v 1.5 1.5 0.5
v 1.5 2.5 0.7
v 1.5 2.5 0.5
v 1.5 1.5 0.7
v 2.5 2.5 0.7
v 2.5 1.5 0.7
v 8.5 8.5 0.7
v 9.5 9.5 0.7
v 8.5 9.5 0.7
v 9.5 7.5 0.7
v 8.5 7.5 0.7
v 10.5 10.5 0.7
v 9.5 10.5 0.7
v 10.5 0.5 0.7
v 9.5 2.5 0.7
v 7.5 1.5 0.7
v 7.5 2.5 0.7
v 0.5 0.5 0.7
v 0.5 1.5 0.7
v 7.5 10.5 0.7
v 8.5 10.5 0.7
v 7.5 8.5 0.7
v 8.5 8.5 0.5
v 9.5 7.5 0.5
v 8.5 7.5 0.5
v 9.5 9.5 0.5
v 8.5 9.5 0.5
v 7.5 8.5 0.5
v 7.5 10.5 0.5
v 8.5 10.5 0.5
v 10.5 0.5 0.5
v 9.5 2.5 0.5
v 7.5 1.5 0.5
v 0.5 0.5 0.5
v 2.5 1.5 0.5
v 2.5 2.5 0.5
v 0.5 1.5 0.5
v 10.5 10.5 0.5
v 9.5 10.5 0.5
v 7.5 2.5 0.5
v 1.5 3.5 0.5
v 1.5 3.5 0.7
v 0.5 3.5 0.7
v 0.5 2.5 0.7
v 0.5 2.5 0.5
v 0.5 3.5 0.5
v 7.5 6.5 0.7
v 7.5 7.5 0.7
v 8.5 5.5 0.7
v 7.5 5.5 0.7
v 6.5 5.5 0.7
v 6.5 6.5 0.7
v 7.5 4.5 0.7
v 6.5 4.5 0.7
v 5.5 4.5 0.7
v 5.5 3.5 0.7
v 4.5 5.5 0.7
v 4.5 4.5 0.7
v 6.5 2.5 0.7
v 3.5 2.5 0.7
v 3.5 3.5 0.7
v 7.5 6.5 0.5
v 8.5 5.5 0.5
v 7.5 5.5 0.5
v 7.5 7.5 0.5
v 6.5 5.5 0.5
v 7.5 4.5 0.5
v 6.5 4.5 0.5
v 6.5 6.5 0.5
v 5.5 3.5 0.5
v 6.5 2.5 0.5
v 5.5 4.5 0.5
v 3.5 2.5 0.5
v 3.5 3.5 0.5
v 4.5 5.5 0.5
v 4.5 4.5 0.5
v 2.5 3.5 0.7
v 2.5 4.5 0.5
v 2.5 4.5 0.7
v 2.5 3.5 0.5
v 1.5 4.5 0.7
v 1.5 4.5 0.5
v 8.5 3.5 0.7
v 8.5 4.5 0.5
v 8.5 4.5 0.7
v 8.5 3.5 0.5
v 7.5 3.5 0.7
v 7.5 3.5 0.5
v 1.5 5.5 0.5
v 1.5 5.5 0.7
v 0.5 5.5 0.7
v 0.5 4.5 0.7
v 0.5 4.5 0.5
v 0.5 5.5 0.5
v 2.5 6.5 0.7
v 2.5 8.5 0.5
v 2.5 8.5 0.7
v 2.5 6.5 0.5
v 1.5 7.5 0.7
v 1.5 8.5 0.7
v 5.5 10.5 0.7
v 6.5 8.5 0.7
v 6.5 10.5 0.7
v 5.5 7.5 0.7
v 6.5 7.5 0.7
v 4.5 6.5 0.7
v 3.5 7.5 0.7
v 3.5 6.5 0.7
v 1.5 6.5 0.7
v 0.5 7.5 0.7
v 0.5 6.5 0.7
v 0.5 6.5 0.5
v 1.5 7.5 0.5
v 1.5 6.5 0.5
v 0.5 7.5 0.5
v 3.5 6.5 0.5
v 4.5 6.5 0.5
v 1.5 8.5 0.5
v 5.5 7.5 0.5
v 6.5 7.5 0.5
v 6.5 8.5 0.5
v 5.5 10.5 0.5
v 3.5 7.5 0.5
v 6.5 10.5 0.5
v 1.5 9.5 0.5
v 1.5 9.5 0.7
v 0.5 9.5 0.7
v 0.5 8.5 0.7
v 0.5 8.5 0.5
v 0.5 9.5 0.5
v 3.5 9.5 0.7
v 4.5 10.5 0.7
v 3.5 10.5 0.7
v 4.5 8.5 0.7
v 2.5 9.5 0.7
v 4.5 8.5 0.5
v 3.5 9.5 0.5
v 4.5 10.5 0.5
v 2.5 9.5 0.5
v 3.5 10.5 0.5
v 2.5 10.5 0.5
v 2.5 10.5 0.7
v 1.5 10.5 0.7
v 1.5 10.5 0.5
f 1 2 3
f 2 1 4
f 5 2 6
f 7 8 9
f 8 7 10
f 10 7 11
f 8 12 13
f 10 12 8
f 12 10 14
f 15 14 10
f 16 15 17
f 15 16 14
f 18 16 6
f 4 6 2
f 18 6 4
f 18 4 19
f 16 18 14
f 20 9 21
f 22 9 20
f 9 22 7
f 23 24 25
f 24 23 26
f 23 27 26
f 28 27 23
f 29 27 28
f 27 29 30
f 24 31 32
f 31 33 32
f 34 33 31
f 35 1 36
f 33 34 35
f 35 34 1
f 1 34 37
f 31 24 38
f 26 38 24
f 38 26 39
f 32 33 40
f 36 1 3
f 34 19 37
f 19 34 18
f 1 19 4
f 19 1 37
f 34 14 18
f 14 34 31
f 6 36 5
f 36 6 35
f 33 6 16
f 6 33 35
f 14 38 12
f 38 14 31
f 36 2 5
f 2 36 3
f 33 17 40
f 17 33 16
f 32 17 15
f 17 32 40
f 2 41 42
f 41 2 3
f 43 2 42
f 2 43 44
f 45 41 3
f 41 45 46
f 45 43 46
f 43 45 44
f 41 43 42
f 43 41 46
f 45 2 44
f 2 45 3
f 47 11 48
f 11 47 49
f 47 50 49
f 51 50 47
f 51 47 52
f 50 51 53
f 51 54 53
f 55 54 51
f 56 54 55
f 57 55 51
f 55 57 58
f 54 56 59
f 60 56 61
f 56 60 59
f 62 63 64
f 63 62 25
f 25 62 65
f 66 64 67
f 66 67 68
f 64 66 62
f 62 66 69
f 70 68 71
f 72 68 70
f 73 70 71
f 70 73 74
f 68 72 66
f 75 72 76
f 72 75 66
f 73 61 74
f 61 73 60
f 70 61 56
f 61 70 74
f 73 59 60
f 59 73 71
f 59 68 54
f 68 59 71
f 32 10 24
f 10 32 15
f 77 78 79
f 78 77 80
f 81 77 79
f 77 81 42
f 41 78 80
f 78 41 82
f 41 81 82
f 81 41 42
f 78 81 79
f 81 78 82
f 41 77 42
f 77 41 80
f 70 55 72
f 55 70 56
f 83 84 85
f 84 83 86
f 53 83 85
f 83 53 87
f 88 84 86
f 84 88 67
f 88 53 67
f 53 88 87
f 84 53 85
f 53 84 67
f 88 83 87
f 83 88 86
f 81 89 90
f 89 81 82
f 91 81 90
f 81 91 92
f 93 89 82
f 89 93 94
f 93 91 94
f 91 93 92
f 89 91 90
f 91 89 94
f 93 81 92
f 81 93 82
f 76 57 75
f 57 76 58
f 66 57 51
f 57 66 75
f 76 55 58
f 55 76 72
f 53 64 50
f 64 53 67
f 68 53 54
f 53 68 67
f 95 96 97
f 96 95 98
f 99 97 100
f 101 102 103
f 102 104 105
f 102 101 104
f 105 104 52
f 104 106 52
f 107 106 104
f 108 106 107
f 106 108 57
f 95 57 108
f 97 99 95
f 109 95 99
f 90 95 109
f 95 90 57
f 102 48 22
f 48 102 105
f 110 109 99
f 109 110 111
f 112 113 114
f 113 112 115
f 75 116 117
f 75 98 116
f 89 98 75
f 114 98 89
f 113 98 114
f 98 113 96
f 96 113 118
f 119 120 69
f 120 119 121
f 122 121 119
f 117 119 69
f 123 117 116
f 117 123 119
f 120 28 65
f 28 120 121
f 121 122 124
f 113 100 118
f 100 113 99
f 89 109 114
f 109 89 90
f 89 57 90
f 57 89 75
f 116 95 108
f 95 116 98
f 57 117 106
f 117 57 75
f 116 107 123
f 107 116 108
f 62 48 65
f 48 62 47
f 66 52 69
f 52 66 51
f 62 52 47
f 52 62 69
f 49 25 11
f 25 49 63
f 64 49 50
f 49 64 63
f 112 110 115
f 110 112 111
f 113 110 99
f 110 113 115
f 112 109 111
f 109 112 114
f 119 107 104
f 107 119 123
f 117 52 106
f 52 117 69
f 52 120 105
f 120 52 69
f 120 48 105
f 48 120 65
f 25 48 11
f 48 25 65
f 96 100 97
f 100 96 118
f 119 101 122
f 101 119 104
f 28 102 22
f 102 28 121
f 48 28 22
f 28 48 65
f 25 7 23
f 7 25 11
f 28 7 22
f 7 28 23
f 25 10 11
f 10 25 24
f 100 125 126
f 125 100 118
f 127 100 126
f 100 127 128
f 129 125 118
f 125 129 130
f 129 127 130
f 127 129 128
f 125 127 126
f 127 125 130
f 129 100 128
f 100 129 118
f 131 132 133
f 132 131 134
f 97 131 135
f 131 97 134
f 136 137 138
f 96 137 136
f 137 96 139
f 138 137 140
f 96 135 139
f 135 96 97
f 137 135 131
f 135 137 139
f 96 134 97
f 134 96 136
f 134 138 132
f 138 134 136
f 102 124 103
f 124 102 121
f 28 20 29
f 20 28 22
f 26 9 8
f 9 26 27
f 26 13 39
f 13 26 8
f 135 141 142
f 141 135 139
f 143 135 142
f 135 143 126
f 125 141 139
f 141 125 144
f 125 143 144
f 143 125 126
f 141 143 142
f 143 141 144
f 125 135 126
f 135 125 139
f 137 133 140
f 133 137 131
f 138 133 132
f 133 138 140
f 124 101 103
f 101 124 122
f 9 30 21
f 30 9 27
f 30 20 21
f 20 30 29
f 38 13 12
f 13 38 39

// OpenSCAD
rotate([0,0,0])translate([0,0,0.6]){
translate([1,1,0])  cube(size = [1,1,0.2], center=true);
translate([2,1,0])  cube(size = [1,1,0.2], center=true);
translate([3,1,0])  cube(size = [1,1,0.2], center=true);
translate([4,1,0])  cube(size = [1,1,0.2], center=true);
translate([5,1,0])  cube(size = [1,1,0.2], center=true);
translate([6,1,0])  cube(size = [1,1,0.2], center=true);
translate([7,1,0])  cube(size = [1,1,0.2], center=true);
translate([8,1,0])  cube(size = [1,1,0.2], center=true);
translate([9,1,0])  cube(size = [1,1,0.2], center=true);
translate([10,1,0])  cube(size = [1,1,0.2], center=true);
translate([10,1,0])  cube(size = [1,1,0.2], center=true);
translate([2,2,0])  cube(size = [1,1,0.2], center=true);
translate([2,2,0])  cube(size = [1,1,0.2], center=true);
translate([2,2,0])  cube(size = [1,1,0.2], center=true);
translate([2,2,0])  cube(size = [1,1,0.2], center=true);
translate([2,2,0])  cube(size = [1,1,0.2], center=true);
translate([2,2,0])  cube(size = [1,1,0.2], center=true);
translate([8,2,0])  cube(size = [1,1,0.2], center=true);
translate([9,2,0])  cube(size = [1,1,0.2], center=true);
translate([10,2,0])  cube(size = [1,1,0.2], center=true);
translate([1,3,0])  cube(size = [1,1,0.2], center=true);
translate([1,3,0])  cube(size = [1,1,0.2], center=true);
translate([1,3,0])  cube(size = [1,1,0.2], center=true);
translate([4,3,0])  cube(size = [1,1,0.2], center=true);
translate([5,3,0])  cube(size = [1,1,0.2], center=true);
translate([6,3,0])  cube(size = [1,1,0.2], center=true);
translate([6,3,0])  cube(size = [1,1,0.2], center=true);
translate([6,3,0])  cube(size = [1,1,0.2], center=true);
translate([6,3,0])  cube(size = [1,1,0.2], center=true);
translate([10,3,0])  cube(size = [1,1,0.2], center=true);
translate([10,3,0])  cube(size = [1,1,0.2], center=true);
translate([2,4,0])  cube(size = [1,1,0.2], center=true);
translate([2,4,0])  cube(size = [1,1,0.2], center=true);
translate([2,4,0])  cube(size = [1,1,0.2], center=true);
translate([2,4,0])  cube(size = [1,1,0.2], center=true);
translate([6,4,0])  cube(size = [1,1,0.2], center=true);
translate([6,4,0])  cube(size = [1,1,0.2], center=true);
translate([8,4,0])  cube(size = [1,1,0.2], center=true);
translate([8,4,0])  cube(size = [1,1,0.2], center=true);
translate([10,4,0])  cube(size = [1,1,0.2], center=true);
translate([1,5,0])  cube(size = [1,1,0.2], center=true);
translate([1,5,0])  cube(size = [1,1,0.2], center=true);
translate([1,5,0])  cube(size = [1,1,0.2], center=true);
translate([1,5,0])  cube(size = [1,1,0.2], center=true);
translate([5,5,0])  cube(size = [1,1,0.2], center=true);
translate([6,5,0])  cube(size = [1,1,0.2], center=true);
translate([7,5,0])  cube(size = [1,1,0.2], center=true);
translate([7,5,0])  cube(size = [1,1,0.2], center=true);
translate([7,5,0])  cube(size = [1,1,0.2], center=true);
translate([10,5,0])  cube(size = [1,1,0.2], center=true);
translate([10,5,0])  cube(size = [1,1,0.2], center=true);
translate([2,6,0])  cube(size = [1,1,0.2], center=true);
translate([3,6,0])  cube(size = [1,1,0.2], center=true);
translate([4,6,0])  cube(size = [1,1,0.2], center=true);
translate([4,6,0])  cube(size = [1,1,0.2], center=true);
translate([4,6,0])  cube(size = [1,1,0.2], center=true);
translate([7,6,0])  cube(size = [1,1,0.2], center=true);
translate([8,6,0])  cube(size = [1,1,0.2], center=true);
translate([8,6,0])  cube(size = [1,1,0.2], center=true);
translate([10,6,0])  cube(size = [1,1,0.2], center=true);
translate([1,7,0])  cube(size = [1,1,0.2], center=true);
translate([2,7,0])  cube(size = [1,1,0.2], center=true);
translate([2,7,0])  cube(size = [1,1,0.2], center=true);
translate([4,7,0])  cube(size = [1,1,0.2], center=true);
translate([5,7,0])  cube(size = [1,1,0.2], center=true);
translate([6,7,0])  cube(size = [1,1,0.2], center=true);
translate([6,7,0])  cube(size = [1,1,0.2], center=true);
translate([8,7,0])  cube(size = [1,1,0.2], center=true);
translate([8,7,0])  cube(size = [1,1,0.2], center=true);
translate([10,7,0])  cube(size = [1,1,0.2], center=true);
translate([10,7,0])  cube(size = [1,1,0.2], center=true);
translate([2,8,0])  cube(size = [1,1,0.2], center=true);
translate([2,8,0])  cube(size = [1,1,0.2], center=true);
translate([2,8,0])  cube(size = [1,1,0.2], center=true);
translate([2,8,0])  cube(size = [1,1,0.2], center=true);
translate([6,8,0])  cube(size = [1,1,0.2], center=true);
translate([7,8,0])  cube(size = [1,1,0.2], center=true);
translate([7,8,0])  cube(size = [1,1,0.2], center=true);
translate([9,8,0])  cube(size = [1,1,0.2], center=true);
translate([10,8,0])  cube(size = [1,1,0.2], center=true);
translate([1,9,0])  cube(size = [1,1,0.2], center=true);
translate([1,9,0])  cube(size = [1,1,0.2], center=true);
translate([3,9,0])  cube(size = [1,1,0.2], center=true);
translate([4,9,0])  cube(size = [1,1,0.2], center=true);
translate([4,9,0])  cube(size = [1,1,0.2], center=true);
translate([6,9,0])  cube(size = [1,1,0.2], center=true);
translate([6,9,0])  cube(size = [1,1,0.2], center=true);
translate([8,9,0])  cube(size = [1,1,0.2], center=true);
translate([9,9,0])  cube(size = [1,1,0.2], center=true);
translate([10,9,0])  cube(size = [1,1,0.2], center=true);
translate([10,9,0])  cube(size = [1,1,0.2], center=true);
translate([2,10,0])  cube(size = [1,1,0.2], center=true);
translate([2,10,0])  cube(size = [1,1,0.2], center=true);
translate([4,10,0])  cube(size = [1,1,0.2], center=true);
translate([4,10,0])  cube(size = [1,1,0.2], center=true);
translate([6,10,0])  cube(size = [1,1,0.2], center=true);
translate([6,10,0])  cube(size = [1,1,0.2], center=true);
translate([8,10,0])  cube(size = [1,1,0.2], center=true);
translate([8,10,0])  cube(size = [1,1,0.2], center=true);
translate([10,10,0])  cube(size = [1,1,0.2], center=true);
}
